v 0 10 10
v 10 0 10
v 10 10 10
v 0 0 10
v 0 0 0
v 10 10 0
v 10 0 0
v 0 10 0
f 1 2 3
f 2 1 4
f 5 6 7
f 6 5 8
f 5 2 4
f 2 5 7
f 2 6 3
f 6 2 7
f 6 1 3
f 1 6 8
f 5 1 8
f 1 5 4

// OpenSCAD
// file: mylib/helpers.scad
// Helper functions loaded via use<>
function helper_size() = 10;
// main file
// Test: use<> instead of include<> with nested includes.
// use<> imports modules/functions but does NOT execute top-level code.
use <mylib/helpers.scad>

// Use a function defined in helpers.scad
cube([helper_size(), helper_size(), helper_size()]);
